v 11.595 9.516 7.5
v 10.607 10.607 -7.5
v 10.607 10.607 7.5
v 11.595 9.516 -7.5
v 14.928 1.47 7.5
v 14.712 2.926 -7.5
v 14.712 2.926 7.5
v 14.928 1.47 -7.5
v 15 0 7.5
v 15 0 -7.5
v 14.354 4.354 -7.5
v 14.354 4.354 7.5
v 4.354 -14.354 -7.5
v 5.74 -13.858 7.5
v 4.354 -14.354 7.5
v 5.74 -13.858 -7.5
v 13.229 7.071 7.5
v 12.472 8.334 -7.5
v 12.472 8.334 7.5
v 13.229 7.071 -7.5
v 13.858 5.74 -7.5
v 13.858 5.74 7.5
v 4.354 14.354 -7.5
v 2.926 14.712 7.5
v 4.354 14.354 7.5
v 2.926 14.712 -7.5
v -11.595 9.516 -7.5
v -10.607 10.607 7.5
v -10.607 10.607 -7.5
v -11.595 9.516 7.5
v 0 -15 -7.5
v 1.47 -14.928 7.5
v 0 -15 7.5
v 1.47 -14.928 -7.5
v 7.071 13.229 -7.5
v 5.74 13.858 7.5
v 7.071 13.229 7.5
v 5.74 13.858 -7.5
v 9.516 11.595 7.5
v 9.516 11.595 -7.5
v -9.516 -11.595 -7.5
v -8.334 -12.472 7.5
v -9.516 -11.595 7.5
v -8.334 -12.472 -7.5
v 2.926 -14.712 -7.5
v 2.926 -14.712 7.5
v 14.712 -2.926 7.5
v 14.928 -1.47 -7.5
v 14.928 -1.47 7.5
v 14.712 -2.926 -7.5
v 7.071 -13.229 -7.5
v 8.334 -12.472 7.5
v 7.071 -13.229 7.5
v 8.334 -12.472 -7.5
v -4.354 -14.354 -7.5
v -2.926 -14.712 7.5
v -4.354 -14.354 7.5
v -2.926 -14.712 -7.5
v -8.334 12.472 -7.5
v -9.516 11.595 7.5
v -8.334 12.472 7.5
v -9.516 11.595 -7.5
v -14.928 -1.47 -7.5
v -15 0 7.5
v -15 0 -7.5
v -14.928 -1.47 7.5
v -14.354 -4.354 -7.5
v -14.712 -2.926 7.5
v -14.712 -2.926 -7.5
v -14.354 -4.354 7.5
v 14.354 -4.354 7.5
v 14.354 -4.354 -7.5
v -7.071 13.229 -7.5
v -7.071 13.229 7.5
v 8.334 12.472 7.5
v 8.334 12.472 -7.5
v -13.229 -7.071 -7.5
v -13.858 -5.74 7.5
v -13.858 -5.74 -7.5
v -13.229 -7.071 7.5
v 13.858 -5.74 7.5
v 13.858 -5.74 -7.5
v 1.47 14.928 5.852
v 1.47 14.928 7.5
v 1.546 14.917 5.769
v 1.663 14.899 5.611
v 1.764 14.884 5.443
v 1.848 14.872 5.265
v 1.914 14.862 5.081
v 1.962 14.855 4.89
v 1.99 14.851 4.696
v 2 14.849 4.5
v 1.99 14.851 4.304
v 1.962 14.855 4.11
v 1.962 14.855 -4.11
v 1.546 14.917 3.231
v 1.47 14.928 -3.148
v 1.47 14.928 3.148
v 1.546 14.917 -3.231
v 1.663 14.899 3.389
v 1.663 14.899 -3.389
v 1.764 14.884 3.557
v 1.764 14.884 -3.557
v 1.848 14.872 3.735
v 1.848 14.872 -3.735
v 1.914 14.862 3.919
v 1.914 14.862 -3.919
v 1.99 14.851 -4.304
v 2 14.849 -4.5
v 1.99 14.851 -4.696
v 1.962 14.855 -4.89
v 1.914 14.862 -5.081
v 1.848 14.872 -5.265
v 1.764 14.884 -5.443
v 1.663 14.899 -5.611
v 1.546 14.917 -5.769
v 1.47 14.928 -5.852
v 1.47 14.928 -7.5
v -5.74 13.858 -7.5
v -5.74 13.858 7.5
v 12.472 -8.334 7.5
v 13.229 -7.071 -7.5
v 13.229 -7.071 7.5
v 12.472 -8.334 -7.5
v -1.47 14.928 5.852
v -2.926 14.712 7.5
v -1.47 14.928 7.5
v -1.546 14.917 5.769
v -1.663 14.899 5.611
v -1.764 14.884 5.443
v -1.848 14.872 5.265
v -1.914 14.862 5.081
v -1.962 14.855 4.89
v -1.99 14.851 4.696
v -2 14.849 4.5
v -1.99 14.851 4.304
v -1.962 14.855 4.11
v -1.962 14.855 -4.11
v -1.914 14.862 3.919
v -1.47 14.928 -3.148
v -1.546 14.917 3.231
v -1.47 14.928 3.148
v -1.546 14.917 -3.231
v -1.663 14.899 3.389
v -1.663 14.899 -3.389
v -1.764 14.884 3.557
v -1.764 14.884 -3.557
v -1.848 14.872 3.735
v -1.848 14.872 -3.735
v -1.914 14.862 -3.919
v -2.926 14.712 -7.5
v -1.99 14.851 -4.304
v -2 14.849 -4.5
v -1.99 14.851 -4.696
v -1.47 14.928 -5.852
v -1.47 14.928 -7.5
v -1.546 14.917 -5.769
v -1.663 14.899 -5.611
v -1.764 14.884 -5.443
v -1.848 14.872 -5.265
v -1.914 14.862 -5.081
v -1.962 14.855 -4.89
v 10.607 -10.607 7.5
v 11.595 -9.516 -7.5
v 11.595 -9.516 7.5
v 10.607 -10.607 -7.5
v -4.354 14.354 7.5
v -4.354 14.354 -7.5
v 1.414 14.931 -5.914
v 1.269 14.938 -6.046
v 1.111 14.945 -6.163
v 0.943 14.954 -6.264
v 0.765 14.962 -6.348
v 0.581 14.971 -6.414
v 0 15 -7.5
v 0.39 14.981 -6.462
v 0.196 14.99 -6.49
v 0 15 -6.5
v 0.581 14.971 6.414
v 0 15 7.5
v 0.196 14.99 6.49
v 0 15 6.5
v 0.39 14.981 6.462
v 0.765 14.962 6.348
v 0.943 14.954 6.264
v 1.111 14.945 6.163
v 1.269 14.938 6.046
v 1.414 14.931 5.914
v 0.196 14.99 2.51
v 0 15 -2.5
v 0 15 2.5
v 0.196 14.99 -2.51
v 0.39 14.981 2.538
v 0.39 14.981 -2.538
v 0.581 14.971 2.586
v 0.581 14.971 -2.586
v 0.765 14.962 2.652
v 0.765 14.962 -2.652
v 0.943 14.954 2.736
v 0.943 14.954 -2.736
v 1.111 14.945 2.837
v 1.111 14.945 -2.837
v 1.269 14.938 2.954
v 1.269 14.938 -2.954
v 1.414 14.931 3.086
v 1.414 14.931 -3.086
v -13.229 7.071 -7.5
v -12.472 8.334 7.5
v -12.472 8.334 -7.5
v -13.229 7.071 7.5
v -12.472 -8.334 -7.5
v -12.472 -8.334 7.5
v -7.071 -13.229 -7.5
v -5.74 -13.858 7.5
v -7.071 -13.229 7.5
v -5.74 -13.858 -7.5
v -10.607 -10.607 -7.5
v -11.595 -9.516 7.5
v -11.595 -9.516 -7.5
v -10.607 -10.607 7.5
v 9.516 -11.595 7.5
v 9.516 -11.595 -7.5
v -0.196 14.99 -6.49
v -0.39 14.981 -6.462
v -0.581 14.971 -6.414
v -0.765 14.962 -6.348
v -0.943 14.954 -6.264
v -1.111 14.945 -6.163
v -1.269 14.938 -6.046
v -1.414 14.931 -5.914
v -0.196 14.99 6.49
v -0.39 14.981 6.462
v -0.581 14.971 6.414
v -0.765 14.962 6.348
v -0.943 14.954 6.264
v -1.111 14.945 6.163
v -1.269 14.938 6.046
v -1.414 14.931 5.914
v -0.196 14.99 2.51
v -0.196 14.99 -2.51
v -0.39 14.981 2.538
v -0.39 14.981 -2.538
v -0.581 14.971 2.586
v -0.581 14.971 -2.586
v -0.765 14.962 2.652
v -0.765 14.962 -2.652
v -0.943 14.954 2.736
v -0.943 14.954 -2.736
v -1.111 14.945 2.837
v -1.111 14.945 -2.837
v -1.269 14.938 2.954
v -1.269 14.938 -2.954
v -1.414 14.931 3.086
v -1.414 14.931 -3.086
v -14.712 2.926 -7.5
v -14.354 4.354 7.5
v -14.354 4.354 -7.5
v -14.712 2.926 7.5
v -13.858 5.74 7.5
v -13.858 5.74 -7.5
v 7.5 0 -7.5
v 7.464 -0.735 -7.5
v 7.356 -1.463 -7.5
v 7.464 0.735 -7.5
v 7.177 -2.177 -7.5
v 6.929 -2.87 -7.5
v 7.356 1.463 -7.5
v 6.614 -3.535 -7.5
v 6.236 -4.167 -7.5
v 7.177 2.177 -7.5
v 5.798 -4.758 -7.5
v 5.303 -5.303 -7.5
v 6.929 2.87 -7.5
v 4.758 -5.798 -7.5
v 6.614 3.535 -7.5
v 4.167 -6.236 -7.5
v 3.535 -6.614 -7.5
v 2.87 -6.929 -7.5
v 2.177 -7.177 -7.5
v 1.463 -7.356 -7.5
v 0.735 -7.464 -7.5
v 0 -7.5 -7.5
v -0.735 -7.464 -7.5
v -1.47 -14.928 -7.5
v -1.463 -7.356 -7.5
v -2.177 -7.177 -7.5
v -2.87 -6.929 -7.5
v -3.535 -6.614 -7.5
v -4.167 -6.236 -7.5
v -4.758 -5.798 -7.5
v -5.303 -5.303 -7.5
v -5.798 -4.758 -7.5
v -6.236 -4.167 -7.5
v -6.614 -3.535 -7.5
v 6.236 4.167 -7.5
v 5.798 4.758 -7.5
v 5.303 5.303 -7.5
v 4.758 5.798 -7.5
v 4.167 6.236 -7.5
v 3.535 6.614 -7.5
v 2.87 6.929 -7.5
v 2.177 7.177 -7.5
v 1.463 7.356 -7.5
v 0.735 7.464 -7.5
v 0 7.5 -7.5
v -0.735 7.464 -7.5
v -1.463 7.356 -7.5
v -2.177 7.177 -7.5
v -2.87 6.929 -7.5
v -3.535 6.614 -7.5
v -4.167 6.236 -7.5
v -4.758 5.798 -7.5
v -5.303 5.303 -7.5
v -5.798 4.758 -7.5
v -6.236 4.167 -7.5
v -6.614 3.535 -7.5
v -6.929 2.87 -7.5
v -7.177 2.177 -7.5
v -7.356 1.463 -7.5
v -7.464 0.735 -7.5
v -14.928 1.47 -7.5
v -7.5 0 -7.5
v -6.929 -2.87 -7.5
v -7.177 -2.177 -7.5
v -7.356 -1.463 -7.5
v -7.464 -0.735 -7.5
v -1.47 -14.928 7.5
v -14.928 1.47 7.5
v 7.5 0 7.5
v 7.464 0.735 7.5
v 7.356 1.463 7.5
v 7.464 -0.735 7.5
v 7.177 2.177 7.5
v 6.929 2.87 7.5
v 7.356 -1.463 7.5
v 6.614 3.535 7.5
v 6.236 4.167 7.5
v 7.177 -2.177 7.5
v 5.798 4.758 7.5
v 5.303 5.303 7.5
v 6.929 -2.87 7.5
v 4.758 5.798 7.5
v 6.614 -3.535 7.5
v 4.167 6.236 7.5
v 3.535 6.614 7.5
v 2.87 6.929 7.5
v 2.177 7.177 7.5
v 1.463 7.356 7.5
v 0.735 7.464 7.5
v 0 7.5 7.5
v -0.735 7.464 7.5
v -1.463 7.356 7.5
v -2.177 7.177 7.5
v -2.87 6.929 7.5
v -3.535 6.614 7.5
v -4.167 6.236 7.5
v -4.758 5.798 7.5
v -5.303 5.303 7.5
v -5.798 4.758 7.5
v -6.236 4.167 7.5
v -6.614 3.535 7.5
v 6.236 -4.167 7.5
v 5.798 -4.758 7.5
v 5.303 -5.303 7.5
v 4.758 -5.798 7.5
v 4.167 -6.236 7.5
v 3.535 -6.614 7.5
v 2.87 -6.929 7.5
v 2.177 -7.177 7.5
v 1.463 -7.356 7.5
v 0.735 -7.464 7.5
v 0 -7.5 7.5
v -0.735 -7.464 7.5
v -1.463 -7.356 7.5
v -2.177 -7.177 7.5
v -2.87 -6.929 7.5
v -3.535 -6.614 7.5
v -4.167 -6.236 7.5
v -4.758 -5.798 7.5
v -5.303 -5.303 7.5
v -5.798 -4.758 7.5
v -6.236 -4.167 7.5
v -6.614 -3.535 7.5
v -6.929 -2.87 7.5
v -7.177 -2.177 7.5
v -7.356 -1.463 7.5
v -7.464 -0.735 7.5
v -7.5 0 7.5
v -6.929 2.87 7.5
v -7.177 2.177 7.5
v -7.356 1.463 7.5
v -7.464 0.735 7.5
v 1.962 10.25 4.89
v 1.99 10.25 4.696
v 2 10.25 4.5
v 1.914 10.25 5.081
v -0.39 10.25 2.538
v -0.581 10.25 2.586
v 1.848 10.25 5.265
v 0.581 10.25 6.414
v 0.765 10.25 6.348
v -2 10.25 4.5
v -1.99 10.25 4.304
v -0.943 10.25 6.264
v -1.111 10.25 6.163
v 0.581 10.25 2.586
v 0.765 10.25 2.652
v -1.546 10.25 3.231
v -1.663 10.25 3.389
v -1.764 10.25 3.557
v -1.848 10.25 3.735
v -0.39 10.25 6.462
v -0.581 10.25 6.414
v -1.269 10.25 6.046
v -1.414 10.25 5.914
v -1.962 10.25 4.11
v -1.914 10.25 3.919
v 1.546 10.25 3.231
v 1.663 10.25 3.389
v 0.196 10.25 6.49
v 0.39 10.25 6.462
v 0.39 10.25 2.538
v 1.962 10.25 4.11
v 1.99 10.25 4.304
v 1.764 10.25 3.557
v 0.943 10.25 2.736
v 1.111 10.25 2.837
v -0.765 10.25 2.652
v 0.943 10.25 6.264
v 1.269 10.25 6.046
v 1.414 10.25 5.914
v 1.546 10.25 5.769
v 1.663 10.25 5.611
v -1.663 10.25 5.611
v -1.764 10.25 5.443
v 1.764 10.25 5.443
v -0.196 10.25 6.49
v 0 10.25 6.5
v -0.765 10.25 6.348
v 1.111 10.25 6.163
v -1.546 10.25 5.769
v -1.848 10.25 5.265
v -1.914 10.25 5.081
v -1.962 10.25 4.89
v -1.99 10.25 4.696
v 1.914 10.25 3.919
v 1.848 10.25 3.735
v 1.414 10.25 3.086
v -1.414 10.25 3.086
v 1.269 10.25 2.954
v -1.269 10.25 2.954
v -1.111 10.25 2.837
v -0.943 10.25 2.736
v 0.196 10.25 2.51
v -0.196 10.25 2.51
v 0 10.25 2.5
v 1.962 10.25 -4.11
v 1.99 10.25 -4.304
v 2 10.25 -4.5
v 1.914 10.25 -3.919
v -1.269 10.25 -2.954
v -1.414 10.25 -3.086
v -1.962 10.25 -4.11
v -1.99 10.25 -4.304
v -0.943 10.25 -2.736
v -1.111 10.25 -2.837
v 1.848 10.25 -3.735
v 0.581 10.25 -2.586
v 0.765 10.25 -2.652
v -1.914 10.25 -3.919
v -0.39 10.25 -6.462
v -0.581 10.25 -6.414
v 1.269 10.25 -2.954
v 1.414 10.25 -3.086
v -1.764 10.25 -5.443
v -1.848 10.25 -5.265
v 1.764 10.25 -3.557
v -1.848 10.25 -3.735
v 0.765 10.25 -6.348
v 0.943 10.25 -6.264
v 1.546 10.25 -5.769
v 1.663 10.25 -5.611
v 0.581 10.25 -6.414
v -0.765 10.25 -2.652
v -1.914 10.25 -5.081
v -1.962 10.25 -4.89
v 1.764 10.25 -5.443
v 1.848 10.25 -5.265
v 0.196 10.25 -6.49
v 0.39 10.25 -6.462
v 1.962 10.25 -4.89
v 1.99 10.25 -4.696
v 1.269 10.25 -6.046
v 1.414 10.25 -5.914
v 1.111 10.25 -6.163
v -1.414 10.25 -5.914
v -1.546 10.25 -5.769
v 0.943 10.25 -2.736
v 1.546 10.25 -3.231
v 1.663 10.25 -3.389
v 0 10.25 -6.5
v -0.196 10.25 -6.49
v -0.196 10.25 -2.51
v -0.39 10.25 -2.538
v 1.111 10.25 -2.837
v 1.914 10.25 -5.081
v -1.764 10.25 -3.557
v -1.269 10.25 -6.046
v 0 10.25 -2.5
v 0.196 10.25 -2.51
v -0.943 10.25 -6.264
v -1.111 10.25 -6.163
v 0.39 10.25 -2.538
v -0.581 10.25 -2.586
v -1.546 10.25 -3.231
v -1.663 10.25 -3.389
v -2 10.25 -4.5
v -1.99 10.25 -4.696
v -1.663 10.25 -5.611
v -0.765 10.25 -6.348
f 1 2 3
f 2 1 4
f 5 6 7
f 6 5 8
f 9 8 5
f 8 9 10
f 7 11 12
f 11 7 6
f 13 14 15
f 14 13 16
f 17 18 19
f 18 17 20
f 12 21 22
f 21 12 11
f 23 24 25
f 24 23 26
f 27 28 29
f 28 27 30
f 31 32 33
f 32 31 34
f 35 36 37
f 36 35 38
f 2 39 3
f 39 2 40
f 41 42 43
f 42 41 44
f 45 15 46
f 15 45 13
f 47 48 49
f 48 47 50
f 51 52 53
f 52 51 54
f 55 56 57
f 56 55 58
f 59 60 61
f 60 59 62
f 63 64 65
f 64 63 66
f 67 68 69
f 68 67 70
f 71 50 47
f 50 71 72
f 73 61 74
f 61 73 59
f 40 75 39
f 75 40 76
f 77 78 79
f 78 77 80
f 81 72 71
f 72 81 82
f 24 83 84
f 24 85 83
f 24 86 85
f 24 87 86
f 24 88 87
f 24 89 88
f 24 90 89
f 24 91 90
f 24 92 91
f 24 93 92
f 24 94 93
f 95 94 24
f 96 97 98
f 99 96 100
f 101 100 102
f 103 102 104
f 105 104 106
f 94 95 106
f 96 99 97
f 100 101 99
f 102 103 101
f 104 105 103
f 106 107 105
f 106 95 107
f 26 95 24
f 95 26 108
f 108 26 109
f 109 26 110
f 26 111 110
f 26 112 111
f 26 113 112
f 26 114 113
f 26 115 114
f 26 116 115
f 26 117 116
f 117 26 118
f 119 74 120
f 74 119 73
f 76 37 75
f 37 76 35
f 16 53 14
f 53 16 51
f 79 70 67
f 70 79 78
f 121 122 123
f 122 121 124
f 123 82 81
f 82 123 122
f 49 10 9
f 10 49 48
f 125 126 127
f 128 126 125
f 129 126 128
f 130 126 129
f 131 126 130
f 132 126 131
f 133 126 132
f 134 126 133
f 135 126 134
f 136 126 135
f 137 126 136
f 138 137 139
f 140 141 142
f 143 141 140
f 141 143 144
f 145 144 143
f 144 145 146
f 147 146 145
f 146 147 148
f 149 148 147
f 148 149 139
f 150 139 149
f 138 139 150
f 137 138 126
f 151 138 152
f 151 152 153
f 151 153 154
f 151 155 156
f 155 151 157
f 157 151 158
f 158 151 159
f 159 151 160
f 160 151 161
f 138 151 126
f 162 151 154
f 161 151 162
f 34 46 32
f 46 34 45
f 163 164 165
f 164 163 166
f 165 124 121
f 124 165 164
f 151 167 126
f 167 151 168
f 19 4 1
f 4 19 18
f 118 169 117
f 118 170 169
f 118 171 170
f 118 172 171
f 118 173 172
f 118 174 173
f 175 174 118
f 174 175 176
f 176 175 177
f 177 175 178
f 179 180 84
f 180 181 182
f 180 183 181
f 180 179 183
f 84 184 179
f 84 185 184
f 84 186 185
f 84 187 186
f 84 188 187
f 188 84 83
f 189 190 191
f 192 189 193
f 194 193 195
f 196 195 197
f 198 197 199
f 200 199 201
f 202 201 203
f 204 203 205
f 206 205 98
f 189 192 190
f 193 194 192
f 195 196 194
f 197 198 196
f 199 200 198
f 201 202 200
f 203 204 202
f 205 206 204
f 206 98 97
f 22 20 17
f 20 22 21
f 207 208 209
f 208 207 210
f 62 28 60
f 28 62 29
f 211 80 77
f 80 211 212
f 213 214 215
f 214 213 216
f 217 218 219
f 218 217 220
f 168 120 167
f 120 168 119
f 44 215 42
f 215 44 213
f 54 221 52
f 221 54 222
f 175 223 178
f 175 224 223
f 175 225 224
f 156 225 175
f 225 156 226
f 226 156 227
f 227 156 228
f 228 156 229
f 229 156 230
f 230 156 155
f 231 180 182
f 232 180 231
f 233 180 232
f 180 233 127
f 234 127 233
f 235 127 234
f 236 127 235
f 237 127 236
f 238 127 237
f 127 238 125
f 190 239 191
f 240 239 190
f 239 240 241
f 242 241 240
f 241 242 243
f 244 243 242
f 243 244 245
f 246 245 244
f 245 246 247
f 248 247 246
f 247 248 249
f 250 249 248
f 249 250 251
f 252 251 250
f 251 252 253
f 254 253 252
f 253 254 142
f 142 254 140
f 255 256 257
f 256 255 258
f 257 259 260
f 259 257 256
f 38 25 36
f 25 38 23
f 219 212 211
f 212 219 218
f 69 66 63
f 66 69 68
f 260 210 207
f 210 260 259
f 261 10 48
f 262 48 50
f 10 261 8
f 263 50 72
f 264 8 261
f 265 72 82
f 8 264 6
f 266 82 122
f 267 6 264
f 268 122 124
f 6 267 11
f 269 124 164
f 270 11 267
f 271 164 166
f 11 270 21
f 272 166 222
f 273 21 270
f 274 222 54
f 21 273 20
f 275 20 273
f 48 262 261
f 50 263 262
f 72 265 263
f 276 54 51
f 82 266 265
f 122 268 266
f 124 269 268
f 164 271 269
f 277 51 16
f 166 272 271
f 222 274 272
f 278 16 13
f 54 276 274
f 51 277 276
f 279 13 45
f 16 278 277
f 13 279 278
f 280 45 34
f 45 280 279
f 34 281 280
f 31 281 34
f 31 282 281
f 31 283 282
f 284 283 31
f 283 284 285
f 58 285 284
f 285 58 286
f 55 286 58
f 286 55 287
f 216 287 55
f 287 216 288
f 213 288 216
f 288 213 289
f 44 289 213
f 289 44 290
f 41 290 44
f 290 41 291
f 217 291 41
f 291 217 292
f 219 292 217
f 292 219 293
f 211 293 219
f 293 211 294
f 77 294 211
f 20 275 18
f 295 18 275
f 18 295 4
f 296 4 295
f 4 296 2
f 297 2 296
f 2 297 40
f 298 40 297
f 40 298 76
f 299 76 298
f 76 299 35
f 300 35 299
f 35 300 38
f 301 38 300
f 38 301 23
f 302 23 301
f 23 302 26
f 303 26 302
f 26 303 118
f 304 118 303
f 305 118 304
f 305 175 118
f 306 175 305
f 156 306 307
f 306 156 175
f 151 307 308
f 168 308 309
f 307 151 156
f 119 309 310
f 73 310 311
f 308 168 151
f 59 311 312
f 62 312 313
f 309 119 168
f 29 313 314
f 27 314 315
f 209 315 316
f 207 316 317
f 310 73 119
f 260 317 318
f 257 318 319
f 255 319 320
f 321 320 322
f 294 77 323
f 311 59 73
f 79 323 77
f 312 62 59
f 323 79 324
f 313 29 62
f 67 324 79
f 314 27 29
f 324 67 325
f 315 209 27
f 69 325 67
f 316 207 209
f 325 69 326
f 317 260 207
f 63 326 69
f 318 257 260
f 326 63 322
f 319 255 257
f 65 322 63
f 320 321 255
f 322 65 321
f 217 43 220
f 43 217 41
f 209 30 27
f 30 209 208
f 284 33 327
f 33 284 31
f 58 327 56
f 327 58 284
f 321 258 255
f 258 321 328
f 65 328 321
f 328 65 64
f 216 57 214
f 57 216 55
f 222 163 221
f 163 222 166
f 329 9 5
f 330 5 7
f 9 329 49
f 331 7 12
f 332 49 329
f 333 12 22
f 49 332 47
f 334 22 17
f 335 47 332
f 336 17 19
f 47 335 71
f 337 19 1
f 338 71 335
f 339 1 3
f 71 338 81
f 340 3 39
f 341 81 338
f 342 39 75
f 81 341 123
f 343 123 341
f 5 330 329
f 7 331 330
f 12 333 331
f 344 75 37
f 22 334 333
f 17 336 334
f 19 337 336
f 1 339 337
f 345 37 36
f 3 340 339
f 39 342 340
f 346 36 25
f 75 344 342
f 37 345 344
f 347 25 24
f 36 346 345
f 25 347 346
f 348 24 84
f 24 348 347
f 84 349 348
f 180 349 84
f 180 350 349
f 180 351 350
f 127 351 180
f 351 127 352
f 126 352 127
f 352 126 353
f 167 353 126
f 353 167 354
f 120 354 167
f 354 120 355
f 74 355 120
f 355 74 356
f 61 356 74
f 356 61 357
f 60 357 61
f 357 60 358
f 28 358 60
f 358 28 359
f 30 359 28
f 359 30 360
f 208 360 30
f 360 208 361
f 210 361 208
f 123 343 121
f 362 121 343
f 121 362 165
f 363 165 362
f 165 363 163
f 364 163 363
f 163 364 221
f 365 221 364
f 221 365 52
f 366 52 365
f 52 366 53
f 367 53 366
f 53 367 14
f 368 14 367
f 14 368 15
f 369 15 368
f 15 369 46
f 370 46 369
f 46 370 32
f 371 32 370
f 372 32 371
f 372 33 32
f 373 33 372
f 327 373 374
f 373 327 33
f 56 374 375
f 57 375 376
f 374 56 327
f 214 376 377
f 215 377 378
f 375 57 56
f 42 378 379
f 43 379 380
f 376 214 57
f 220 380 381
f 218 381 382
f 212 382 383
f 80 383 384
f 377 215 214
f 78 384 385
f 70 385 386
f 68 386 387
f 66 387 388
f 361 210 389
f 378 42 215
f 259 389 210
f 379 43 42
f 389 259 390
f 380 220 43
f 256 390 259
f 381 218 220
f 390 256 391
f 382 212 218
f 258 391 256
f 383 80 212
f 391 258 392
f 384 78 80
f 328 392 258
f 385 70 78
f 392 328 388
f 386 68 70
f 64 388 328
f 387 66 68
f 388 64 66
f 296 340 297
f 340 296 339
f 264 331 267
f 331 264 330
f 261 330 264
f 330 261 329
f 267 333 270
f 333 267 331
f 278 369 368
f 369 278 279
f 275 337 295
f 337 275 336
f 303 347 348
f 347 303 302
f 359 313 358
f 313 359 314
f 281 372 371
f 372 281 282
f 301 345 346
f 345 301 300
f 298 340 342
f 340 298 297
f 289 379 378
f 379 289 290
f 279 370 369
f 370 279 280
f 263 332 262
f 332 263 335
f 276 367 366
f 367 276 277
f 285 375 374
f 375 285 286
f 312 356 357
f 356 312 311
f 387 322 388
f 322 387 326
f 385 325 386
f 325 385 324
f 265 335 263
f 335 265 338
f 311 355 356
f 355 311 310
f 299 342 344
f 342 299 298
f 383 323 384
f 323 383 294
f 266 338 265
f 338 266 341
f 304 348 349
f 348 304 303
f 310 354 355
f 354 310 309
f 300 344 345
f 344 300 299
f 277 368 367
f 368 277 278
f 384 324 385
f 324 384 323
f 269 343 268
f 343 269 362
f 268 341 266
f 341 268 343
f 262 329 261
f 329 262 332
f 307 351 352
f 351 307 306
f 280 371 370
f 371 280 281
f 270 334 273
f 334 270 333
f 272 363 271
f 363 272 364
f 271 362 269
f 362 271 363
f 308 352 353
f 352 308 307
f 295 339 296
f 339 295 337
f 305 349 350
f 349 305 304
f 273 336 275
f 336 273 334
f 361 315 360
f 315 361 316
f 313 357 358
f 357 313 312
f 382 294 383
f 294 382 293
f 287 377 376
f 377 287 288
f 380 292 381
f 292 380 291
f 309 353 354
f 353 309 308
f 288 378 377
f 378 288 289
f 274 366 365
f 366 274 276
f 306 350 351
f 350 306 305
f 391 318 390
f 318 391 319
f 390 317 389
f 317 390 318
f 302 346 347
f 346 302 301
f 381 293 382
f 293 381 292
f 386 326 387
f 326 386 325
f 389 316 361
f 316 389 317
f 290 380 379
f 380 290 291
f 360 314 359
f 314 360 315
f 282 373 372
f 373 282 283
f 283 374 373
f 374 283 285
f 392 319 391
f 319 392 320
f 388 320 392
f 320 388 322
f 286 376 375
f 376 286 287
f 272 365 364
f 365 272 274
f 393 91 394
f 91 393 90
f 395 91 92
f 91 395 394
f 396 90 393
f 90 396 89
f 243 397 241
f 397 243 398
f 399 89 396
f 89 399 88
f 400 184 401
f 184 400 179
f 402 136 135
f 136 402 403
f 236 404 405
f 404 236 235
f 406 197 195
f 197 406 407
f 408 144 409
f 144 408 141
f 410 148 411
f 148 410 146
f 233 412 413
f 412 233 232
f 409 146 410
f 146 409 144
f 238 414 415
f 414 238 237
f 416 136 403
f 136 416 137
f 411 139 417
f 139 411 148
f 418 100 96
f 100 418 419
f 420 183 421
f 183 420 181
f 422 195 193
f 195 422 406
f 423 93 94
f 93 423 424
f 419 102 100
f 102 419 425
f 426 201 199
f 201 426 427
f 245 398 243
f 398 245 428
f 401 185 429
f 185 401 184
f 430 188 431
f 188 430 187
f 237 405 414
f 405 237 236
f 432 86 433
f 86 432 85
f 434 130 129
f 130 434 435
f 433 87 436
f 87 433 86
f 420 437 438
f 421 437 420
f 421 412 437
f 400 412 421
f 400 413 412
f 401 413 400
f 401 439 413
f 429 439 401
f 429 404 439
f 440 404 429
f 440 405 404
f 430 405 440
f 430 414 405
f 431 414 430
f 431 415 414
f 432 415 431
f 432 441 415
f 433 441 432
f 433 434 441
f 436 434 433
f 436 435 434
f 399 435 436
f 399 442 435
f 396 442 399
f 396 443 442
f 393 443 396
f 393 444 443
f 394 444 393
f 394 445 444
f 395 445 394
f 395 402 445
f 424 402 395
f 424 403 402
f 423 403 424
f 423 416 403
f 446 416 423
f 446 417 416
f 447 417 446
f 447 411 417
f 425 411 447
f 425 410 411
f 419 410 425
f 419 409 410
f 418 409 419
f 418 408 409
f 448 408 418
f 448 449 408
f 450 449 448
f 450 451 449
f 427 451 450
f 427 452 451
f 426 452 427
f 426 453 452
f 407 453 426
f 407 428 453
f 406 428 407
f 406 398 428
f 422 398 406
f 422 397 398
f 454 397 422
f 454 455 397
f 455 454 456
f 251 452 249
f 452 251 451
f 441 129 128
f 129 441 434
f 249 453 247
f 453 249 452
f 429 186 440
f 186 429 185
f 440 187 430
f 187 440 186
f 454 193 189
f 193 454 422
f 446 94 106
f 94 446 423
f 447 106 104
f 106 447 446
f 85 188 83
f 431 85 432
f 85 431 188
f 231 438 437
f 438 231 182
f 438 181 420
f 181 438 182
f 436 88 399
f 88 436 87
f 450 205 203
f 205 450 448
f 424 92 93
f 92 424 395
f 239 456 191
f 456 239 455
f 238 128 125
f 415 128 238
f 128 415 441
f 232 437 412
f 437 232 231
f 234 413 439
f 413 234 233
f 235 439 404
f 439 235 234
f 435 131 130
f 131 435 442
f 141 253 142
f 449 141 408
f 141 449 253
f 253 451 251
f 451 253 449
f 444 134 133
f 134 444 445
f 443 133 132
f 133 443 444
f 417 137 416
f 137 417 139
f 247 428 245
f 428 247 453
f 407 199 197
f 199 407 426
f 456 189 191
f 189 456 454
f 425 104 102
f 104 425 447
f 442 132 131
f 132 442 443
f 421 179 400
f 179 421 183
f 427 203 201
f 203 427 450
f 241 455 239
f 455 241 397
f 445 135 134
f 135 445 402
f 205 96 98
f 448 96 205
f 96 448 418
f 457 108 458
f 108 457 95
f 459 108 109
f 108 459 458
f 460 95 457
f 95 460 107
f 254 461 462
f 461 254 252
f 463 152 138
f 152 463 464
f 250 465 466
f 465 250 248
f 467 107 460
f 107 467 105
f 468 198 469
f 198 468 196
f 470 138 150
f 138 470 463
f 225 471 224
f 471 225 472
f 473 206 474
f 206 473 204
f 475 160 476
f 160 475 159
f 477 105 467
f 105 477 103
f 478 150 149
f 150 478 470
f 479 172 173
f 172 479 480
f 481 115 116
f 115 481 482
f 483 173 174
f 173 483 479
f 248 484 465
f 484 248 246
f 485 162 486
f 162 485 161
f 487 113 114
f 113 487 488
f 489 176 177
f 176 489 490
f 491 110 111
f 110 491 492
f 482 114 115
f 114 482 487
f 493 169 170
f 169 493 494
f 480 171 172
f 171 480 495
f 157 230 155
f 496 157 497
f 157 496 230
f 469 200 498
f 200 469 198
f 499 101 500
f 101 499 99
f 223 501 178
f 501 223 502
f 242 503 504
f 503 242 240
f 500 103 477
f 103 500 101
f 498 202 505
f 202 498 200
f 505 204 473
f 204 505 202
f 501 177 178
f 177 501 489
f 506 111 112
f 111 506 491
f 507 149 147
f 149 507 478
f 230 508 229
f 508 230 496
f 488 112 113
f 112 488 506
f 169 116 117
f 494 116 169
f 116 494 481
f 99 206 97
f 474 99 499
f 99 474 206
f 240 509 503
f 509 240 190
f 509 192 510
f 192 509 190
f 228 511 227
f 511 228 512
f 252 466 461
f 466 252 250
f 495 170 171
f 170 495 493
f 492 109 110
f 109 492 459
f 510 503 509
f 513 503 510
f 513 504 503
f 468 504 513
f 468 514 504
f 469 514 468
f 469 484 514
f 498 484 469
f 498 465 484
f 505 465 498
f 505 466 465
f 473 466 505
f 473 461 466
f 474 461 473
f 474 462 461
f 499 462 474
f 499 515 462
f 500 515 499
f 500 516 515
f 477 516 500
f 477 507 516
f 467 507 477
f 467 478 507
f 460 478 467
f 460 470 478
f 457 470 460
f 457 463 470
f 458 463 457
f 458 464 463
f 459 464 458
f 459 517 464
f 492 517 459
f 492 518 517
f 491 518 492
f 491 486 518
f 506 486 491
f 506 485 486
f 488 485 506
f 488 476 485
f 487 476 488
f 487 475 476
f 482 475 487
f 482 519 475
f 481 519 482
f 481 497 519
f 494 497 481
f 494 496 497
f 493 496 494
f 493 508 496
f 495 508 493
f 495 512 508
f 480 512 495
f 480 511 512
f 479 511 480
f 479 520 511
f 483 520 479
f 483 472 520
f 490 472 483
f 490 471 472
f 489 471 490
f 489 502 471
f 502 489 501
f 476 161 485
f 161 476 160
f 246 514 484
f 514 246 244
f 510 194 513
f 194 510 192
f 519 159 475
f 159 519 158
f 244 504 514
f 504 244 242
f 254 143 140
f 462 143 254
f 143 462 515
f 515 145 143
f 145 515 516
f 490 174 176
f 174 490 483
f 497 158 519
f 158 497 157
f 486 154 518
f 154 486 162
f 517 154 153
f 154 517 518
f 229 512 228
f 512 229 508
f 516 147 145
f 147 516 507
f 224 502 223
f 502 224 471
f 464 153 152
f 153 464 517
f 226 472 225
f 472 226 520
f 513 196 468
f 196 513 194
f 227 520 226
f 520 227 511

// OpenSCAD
// COBRA Vertebra - C7 V6
// Height: 15.0mm, OD: 30.0mm

$fn = 64;

difference() {
    // Outer cylinder
    cylinder(h=15.0, d=30.0, center=true);
    
    // Inner channel
    cylinder(h=17.0, d=15.0, center=true);

    // Pivot holes
    translate([0, 15.0, 4.5])
    rotate([90, 0, 0])
    cylinder(h=9.5, d=4, center=true);
    
    translate([0, 15.0, -4.5])
    rotate([90, 0, 0])
    cylinder(h=9.5, d=4, center=true);
}
